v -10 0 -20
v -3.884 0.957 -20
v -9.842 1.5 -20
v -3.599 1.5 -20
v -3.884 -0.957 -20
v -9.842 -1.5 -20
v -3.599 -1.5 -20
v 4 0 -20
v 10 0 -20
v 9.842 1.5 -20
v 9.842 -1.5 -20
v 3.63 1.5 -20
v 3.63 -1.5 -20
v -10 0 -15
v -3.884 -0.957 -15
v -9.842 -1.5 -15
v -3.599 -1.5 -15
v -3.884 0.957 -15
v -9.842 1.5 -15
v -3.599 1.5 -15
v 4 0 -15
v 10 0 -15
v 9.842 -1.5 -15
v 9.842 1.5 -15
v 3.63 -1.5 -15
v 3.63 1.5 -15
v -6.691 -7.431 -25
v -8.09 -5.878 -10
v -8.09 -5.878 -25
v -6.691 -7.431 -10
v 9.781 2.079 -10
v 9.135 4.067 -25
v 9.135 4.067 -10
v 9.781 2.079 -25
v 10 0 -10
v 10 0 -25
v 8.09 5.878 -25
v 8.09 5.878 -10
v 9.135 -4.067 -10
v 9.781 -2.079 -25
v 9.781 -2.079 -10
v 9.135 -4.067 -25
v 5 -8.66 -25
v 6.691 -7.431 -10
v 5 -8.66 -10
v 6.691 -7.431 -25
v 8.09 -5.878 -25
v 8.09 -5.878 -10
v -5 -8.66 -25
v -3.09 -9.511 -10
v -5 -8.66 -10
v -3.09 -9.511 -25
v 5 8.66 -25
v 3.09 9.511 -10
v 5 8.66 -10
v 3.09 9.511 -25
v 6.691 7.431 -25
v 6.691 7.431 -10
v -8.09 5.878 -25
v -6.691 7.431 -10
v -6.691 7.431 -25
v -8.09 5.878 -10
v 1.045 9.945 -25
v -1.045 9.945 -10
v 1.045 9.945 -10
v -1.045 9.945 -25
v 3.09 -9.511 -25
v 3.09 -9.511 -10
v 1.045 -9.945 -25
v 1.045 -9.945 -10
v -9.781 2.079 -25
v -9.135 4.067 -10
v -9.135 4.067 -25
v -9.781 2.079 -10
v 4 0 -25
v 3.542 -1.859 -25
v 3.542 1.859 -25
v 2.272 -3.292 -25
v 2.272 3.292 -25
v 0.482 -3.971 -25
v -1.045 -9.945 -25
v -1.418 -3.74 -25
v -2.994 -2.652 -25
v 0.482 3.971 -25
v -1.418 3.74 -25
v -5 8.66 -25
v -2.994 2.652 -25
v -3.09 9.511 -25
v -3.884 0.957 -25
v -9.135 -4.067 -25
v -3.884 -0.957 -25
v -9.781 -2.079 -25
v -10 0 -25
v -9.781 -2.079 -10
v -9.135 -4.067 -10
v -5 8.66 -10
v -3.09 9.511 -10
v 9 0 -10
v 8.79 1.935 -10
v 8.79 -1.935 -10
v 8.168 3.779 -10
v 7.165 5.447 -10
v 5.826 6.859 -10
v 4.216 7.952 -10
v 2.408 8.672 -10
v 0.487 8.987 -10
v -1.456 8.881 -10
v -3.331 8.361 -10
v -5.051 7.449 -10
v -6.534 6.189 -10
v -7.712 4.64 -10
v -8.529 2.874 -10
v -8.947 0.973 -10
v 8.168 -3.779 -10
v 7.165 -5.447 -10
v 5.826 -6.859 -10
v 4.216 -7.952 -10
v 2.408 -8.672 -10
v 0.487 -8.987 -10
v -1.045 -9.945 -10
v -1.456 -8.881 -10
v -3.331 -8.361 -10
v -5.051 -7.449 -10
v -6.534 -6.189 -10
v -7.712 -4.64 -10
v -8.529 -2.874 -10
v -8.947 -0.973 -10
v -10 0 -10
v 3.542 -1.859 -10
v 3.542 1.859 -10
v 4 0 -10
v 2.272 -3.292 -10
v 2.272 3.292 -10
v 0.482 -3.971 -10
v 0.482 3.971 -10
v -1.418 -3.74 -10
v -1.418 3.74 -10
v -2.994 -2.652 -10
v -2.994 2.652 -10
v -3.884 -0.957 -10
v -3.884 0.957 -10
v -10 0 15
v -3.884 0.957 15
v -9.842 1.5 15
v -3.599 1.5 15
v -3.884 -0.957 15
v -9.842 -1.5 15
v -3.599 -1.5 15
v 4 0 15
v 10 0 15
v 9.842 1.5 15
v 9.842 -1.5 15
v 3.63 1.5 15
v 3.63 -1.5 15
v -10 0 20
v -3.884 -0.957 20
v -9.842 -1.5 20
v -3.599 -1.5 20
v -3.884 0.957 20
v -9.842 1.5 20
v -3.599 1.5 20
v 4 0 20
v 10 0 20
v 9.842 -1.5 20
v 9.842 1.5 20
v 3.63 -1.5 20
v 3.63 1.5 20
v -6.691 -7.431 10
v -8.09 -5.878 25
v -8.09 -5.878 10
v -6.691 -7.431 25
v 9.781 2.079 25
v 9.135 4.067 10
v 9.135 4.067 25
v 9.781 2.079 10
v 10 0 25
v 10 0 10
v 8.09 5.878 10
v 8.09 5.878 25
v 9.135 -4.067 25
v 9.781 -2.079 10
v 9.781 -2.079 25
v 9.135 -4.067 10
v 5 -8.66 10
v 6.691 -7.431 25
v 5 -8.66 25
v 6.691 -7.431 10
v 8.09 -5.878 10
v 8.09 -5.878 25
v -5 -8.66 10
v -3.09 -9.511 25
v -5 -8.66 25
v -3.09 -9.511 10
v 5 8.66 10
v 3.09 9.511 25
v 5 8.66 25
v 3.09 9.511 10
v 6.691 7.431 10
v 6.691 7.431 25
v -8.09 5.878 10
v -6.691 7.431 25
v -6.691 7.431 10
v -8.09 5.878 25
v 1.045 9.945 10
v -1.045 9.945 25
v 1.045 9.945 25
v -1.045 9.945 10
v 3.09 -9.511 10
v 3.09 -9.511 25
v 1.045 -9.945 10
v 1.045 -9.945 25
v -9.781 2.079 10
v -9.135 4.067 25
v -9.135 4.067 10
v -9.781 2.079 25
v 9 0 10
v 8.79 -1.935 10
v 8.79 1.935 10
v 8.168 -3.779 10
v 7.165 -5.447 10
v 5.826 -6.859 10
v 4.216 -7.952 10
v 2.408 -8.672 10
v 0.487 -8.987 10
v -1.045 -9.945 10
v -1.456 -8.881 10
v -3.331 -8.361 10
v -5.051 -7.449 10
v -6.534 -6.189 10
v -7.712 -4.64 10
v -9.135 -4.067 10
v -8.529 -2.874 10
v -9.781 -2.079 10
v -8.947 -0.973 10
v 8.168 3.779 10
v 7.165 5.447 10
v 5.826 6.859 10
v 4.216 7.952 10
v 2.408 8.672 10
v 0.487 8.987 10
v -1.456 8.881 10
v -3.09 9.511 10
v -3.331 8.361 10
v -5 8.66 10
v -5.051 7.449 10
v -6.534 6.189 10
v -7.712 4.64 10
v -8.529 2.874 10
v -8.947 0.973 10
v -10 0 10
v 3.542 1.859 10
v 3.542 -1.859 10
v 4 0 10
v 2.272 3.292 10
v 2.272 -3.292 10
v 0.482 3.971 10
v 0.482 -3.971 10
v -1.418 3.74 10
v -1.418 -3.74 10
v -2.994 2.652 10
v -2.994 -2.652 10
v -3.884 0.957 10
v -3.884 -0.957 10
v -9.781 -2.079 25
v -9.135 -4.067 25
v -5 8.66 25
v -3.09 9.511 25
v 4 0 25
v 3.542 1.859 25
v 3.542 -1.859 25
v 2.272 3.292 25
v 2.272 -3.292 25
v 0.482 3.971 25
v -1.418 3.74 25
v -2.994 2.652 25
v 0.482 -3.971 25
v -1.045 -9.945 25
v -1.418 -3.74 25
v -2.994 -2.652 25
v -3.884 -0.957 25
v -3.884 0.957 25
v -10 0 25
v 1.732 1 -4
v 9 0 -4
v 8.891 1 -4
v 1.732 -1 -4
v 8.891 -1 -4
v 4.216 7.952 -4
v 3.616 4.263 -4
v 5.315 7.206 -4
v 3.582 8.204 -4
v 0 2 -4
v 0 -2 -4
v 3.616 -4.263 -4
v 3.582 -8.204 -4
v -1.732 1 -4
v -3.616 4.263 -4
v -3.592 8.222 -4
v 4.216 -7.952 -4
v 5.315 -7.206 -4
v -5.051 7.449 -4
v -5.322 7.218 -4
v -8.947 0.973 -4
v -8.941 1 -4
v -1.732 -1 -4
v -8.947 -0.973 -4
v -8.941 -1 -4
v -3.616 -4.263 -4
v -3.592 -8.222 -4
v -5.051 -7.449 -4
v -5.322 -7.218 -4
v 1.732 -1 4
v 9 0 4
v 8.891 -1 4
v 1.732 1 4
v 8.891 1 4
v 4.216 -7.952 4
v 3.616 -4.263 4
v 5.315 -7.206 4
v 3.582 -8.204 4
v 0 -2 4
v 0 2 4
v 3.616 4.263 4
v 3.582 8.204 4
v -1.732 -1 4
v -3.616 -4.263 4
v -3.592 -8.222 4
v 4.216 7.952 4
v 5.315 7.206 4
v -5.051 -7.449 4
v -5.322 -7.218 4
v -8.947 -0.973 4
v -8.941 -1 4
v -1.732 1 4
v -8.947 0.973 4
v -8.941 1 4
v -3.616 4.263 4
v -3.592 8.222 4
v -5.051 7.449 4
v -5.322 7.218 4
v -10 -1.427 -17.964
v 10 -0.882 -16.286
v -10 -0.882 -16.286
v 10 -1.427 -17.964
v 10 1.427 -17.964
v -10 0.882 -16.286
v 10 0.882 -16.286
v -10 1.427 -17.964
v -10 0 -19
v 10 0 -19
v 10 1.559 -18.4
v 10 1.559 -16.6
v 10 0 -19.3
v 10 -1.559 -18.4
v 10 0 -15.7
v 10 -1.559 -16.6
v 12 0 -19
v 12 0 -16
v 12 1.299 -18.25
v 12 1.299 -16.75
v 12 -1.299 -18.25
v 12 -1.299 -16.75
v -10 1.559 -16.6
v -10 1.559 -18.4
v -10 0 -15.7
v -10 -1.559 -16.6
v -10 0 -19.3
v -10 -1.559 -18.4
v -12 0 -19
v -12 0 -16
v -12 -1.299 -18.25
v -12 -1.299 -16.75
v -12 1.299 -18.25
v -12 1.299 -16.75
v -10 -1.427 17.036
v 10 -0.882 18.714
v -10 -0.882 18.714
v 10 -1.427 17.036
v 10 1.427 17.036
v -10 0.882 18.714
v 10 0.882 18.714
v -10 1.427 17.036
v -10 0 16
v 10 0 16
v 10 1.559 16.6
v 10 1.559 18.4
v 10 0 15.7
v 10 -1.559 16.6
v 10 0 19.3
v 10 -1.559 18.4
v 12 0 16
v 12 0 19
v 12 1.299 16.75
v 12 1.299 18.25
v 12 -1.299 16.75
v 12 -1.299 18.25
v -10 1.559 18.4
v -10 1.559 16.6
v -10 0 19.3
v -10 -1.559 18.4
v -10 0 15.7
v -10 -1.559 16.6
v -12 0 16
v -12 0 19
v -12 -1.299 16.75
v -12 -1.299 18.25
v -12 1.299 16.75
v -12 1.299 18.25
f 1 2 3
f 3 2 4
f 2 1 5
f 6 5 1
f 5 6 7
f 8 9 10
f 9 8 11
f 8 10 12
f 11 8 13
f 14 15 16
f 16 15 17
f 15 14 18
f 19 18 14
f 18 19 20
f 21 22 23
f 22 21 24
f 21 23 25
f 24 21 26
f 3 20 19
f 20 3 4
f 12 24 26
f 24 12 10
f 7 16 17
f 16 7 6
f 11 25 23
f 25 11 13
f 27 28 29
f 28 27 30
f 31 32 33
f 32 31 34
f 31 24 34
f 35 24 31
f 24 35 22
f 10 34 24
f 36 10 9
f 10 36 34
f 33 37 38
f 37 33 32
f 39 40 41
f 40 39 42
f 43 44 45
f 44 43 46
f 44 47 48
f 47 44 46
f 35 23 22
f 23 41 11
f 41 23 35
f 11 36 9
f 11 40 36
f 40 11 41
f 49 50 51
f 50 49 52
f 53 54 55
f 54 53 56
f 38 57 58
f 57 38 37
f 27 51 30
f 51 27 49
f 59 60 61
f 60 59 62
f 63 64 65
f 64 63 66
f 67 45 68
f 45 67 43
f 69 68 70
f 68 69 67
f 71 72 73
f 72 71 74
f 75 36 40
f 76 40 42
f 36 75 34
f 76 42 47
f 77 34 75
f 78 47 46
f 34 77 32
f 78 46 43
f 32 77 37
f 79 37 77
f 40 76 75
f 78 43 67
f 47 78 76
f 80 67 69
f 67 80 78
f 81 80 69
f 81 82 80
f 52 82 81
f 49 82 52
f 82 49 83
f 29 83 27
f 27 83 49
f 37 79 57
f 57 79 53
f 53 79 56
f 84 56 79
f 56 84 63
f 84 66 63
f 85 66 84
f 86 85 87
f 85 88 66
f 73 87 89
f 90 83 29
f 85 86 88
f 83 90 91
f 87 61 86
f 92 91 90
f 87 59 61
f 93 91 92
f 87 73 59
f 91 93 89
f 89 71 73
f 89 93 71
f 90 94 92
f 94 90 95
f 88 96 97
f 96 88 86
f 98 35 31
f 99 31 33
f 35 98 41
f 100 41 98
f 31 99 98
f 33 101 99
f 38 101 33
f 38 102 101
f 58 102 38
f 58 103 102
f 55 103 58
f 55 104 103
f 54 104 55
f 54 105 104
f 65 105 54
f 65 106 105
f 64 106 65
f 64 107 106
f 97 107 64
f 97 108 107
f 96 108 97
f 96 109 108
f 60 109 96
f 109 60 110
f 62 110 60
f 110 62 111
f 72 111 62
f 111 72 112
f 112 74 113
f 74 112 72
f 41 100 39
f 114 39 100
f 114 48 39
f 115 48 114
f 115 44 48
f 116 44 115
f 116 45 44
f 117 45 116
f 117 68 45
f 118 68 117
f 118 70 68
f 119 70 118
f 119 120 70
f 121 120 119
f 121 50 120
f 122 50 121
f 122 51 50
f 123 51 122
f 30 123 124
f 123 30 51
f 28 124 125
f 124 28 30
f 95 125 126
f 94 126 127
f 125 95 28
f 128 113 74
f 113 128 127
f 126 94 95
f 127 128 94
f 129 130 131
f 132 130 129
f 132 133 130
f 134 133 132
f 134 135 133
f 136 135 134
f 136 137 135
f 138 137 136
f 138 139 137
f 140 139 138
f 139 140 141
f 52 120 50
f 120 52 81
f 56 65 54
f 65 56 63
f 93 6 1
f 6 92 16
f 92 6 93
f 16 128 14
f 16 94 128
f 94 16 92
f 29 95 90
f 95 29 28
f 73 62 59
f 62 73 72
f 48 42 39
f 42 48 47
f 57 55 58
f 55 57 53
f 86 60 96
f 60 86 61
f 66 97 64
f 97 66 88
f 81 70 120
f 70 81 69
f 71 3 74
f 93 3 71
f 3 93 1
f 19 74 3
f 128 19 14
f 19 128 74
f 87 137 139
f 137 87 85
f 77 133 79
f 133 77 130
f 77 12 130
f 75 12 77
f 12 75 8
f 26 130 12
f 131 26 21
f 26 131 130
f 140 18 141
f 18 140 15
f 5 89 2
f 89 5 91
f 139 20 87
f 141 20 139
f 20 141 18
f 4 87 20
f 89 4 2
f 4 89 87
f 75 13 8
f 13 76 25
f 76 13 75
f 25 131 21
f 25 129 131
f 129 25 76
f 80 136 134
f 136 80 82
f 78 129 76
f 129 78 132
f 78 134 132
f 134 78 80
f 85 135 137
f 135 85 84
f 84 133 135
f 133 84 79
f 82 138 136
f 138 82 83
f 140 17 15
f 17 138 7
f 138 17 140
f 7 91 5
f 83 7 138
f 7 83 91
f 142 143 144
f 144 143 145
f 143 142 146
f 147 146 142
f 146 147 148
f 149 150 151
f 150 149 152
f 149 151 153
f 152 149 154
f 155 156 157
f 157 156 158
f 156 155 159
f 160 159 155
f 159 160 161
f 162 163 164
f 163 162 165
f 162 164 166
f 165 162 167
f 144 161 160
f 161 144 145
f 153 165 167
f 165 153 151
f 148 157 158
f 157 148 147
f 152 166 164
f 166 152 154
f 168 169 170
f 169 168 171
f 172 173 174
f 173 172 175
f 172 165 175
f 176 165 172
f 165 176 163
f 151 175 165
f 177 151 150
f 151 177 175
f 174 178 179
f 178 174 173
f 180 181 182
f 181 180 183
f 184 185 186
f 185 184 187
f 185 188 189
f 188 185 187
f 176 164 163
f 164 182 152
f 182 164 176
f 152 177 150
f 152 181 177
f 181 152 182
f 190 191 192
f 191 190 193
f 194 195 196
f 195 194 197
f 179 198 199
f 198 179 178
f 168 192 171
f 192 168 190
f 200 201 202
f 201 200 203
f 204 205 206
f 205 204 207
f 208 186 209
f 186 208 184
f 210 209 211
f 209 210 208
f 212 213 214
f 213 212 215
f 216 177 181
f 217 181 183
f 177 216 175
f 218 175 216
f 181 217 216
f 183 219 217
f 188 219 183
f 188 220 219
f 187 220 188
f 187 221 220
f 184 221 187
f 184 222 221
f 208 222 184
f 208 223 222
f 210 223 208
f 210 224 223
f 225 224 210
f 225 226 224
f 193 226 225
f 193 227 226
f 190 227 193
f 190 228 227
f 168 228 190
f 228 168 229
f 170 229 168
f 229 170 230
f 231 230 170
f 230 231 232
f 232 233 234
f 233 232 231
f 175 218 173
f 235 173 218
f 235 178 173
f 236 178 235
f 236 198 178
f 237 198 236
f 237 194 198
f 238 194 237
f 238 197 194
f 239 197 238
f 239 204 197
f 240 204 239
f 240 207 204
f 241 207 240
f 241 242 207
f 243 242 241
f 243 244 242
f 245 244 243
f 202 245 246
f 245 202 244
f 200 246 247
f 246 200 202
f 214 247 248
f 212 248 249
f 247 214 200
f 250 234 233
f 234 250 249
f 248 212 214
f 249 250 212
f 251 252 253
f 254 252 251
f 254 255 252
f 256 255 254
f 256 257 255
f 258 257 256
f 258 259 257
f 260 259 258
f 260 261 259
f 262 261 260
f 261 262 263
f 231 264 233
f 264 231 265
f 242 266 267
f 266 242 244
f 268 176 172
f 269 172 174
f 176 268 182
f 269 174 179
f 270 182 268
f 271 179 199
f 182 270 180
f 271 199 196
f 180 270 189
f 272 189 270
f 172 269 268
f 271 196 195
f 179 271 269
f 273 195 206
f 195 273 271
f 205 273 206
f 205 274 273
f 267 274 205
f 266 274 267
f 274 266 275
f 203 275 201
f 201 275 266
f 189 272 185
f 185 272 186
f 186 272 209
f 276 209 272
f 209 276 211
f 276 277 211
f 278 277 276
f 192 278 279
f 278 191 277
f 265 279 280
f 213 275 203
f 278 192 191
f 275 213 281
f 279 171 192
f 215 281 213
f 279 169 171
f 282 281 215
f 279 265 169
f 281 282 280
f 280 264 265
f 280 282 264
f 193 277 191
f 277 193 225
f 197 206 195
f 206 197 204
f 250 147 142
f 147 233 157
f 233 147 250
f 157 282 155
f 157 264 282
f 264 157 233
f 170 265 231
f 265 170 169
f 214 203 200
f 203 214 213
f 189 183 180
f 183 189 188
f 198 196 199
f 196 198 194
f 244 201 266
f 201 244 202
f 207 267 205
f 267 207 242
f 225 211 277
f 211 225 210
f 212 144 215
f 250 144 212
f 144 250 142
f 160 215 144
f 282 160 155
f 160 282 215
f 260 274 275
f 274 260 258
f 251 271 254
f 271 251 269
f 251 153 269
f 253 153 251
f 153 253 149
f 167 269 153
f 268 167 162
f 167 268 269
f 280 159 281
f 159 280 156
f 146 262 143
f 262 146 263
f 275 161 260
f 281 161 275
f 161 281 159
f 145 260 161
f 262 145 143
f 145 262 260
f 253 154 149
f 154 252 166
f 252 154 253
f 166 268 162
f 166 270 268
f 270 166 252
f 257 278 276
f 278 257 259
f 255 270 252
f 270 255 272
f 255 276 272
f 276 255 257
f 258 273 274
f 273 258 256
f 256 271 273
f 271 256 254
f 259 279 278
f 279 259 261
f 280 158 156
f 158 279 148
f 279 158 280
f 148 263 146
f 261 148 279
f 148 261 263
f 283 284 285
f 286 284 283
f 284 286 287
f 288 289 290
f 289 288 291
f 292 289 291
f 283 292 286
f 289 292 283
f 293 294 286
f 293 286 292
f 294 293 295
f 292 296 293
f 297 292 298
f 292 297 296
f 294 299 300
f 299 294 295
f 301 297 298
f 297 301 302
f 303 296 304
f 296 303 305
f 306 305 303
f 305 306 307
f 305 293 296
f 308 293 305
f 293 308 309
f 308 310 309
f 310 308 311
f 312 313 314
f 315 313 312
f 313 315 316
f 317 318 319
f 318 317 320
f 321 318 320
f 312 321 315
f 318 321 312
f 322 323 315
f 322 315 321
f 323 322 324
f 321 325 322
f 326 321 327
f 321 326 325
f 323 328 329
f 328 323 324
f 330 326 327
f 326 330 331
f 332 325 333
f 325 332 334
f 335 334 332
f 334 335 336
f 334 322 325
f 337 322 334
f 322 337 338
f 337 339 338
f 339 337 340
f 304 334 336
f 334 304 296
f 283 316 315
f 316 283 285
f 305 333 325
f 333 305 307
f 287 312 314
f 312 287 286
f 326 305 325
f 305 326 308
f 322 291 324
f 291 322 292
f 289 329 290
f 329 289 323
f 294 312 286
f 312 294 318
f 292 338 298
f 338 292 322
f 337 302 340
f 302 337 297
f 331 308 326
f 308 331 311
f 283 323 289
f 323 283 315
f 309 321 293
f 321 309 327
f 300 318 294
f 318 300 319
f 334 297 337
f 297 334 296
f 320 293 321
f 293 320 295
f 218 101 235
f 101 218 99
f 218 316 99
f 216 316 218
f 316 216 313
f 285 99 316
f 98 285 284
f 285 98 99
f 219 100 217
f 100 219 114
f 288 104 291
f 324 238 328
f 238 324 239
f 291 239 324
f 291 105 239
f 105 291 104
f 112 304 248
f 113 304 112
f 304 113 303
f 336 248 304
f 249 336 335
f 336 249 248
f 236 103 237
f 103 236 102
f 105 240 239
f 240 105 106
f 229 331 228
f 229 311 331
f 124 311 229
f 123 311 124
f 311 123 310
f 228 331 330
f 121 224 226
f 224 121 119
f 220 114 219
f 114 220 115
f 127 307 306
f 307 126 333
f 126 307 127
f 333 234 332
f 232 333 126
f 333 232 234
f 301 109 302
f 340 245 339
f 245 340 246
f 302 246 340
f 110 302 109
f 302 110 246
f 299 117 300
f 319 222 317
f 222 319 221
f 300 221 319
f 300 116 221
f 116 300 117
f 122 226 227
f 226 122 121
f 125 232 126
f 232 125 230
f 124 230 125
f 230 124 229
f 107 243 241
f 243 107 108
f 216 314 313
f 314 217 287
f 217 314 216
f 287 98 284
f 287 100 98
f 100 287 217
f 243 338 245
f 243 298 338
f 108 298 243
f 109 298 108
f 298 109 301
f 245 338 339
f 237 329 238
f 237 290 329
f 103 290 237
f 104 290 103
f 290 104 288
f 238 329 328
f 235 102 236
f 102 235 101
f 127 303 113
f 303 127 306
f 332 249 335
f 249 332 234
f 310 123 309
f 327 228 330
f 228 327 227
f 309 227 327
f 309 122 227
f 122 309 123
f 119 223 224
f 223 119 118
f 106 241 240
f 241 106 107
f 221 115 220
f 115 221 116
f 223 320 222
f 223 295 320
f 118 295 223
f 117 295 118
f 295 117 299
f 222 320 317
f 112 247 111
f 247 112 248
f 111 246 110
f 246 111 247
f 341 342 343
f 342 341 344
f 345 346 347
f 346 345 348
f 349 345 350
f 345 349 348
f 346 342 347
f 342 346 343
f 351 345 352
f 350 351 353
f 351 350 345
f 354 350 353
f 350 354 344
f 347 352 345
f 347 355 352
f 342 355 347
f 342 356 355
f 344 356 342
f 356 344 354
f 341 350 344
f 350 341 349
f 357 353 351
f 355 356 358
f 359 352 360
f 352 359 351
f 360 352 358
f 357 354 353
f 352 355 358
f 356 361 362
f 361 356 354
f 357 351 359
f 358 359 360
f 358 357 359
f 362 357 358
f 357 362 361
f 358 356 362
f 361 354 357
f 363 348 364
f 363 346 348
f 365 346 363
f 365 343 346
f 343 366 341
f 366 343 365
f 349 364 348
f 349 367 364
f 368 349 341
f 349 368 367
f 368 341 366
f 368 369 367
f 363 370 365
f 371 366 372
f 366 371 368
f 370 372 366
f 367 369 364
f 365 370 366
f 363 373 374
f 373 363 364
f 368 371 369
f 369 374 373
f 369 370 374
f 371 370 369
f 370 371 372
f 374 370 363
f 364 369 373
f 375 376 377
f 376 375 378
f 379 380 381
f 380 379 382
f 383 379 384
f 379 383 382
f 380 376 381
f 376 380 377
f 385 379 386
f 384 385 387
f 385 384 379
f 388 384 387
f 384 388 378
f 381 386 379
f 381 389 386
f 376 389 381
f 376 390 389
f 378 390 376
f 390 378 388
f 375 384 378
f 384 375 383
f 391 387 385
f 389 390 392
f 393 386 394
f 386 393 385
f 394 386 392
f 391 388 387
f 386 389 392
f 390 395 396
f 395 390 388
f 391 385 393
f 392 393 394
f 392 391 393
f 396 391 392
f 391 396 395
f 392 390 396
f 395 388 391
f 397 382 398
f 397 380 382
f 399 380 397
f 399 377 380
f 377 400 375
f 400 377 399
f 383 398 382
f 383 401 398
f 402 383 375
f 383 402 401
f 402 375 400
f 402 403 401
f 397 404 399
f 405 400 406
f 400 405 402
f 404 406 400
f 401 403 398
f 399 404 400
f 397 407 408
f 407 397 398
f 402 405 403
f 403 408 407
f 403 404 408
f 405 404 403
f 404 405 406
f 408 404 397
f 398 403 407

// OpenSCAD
// Parameters
hub_diameter = 20;
hub_length = 15;
bore_diameter = 8;
slot_width = 2;
slot_depth = 8;
fastener_diameter = 3;
fastener_length = 10;
flexible_element_length = 20;
flexible_element_diameter = 18;
slot_count = 6;
clamping_slot_depth = 5;
clamping_slot_width = 3;
chamfer_size = 2;

// Clamping Hub Module with distinct slots
module clamping_hub() {
    difference() {
        // Main cylindrical hub
        cylinder(h = hub_length, d = hub_diameter, center = true);
        
        // Central bore
        cylinder(h = hub_length + 2, d = bore_diameter, center = true);
        
        // Clamping slots
        for (i = [0:1]) {
            rotate([0, 0, i * 180])
                translate([hub_diameter / 4, 0, 0])
                rotate([0, 90, 0])
                cube([clamping_slot_depth, clamping_slot_width, hub_length], center = true);
        }
        
        // Fastener holes
        for (i = [0:1]) {
            rotate([0, 0, i * 180])
                translate([hub_diameter / 4, 0, 0])
                rotate([0, 90, 0])
                cylinder(h = hub_diameter + 2, d = fastener_diameter, center = true);
        }
    }
}

// Flexible Element Module with slotted cuts
module flexible_element() {
    difference() {
        // Main cylindrical body
        cylinder(h = flexible_element_length, d = flexible_element_diameter, center = true);
        
        // Slotted cuts for flexibility
        for (i = [0:slot_count-1]) {
            rotate([0, 0, i * (360 / slot_count)])
                translate([flexible_element_diameter / 4, 0, 0])
                rotate([0, 90, 0])
                cube([slot_depth, slot_width, flexible_element_length], center = true);
        }
    }
}

// Fastener Module with proper size and positioning
module fastener() {
    union() {
        // Main fastener body
        cylinder(h = fastener_length, d = fastener_diameter, center = true);
        
        // Hexagonal head
        translate([0, 0, fastener_length / 2])
            cylinder(h = 2, d1 = fastener_diameter * 1.2, d2 = fastener_diameter, $fn = 6, center = false);
    }
}

// Assembly
module flexible_coupling() {
    // Clamping Hub 1
    translate([0, 0, -flexible_element_length / 2 - hub_length / 2])
        clamping_hub();
    
    // Clamping Hub 2
    translate([0, 0, flexible_element_length / 2 + hub_length / 2])
        clamping_hub();
    
    // Flexible Element
    flexible_element();
    
    // Fasteners for Clamping Hub 1
    for (i = [0:1]) {
        rotate([0, 0, i * 180])
            translate([hub_diameter / 4, 0, -flexible_element_length / 2 - hub_length / 2])
            rotate([0, 90, 0])
            fastener();
    }
    
    // Fasteners for Clamping Hub 2
    for (i = [0:1]) {
        rotate([0, 0, i * 180])
            translate([hub_diameter / 4, 0, flexible_element_length / 2 + hub_length / 2])
            rotate([0, 90, 0])
            fastener();
    }
}

// Render the complete assembly
flexible_coupling();
